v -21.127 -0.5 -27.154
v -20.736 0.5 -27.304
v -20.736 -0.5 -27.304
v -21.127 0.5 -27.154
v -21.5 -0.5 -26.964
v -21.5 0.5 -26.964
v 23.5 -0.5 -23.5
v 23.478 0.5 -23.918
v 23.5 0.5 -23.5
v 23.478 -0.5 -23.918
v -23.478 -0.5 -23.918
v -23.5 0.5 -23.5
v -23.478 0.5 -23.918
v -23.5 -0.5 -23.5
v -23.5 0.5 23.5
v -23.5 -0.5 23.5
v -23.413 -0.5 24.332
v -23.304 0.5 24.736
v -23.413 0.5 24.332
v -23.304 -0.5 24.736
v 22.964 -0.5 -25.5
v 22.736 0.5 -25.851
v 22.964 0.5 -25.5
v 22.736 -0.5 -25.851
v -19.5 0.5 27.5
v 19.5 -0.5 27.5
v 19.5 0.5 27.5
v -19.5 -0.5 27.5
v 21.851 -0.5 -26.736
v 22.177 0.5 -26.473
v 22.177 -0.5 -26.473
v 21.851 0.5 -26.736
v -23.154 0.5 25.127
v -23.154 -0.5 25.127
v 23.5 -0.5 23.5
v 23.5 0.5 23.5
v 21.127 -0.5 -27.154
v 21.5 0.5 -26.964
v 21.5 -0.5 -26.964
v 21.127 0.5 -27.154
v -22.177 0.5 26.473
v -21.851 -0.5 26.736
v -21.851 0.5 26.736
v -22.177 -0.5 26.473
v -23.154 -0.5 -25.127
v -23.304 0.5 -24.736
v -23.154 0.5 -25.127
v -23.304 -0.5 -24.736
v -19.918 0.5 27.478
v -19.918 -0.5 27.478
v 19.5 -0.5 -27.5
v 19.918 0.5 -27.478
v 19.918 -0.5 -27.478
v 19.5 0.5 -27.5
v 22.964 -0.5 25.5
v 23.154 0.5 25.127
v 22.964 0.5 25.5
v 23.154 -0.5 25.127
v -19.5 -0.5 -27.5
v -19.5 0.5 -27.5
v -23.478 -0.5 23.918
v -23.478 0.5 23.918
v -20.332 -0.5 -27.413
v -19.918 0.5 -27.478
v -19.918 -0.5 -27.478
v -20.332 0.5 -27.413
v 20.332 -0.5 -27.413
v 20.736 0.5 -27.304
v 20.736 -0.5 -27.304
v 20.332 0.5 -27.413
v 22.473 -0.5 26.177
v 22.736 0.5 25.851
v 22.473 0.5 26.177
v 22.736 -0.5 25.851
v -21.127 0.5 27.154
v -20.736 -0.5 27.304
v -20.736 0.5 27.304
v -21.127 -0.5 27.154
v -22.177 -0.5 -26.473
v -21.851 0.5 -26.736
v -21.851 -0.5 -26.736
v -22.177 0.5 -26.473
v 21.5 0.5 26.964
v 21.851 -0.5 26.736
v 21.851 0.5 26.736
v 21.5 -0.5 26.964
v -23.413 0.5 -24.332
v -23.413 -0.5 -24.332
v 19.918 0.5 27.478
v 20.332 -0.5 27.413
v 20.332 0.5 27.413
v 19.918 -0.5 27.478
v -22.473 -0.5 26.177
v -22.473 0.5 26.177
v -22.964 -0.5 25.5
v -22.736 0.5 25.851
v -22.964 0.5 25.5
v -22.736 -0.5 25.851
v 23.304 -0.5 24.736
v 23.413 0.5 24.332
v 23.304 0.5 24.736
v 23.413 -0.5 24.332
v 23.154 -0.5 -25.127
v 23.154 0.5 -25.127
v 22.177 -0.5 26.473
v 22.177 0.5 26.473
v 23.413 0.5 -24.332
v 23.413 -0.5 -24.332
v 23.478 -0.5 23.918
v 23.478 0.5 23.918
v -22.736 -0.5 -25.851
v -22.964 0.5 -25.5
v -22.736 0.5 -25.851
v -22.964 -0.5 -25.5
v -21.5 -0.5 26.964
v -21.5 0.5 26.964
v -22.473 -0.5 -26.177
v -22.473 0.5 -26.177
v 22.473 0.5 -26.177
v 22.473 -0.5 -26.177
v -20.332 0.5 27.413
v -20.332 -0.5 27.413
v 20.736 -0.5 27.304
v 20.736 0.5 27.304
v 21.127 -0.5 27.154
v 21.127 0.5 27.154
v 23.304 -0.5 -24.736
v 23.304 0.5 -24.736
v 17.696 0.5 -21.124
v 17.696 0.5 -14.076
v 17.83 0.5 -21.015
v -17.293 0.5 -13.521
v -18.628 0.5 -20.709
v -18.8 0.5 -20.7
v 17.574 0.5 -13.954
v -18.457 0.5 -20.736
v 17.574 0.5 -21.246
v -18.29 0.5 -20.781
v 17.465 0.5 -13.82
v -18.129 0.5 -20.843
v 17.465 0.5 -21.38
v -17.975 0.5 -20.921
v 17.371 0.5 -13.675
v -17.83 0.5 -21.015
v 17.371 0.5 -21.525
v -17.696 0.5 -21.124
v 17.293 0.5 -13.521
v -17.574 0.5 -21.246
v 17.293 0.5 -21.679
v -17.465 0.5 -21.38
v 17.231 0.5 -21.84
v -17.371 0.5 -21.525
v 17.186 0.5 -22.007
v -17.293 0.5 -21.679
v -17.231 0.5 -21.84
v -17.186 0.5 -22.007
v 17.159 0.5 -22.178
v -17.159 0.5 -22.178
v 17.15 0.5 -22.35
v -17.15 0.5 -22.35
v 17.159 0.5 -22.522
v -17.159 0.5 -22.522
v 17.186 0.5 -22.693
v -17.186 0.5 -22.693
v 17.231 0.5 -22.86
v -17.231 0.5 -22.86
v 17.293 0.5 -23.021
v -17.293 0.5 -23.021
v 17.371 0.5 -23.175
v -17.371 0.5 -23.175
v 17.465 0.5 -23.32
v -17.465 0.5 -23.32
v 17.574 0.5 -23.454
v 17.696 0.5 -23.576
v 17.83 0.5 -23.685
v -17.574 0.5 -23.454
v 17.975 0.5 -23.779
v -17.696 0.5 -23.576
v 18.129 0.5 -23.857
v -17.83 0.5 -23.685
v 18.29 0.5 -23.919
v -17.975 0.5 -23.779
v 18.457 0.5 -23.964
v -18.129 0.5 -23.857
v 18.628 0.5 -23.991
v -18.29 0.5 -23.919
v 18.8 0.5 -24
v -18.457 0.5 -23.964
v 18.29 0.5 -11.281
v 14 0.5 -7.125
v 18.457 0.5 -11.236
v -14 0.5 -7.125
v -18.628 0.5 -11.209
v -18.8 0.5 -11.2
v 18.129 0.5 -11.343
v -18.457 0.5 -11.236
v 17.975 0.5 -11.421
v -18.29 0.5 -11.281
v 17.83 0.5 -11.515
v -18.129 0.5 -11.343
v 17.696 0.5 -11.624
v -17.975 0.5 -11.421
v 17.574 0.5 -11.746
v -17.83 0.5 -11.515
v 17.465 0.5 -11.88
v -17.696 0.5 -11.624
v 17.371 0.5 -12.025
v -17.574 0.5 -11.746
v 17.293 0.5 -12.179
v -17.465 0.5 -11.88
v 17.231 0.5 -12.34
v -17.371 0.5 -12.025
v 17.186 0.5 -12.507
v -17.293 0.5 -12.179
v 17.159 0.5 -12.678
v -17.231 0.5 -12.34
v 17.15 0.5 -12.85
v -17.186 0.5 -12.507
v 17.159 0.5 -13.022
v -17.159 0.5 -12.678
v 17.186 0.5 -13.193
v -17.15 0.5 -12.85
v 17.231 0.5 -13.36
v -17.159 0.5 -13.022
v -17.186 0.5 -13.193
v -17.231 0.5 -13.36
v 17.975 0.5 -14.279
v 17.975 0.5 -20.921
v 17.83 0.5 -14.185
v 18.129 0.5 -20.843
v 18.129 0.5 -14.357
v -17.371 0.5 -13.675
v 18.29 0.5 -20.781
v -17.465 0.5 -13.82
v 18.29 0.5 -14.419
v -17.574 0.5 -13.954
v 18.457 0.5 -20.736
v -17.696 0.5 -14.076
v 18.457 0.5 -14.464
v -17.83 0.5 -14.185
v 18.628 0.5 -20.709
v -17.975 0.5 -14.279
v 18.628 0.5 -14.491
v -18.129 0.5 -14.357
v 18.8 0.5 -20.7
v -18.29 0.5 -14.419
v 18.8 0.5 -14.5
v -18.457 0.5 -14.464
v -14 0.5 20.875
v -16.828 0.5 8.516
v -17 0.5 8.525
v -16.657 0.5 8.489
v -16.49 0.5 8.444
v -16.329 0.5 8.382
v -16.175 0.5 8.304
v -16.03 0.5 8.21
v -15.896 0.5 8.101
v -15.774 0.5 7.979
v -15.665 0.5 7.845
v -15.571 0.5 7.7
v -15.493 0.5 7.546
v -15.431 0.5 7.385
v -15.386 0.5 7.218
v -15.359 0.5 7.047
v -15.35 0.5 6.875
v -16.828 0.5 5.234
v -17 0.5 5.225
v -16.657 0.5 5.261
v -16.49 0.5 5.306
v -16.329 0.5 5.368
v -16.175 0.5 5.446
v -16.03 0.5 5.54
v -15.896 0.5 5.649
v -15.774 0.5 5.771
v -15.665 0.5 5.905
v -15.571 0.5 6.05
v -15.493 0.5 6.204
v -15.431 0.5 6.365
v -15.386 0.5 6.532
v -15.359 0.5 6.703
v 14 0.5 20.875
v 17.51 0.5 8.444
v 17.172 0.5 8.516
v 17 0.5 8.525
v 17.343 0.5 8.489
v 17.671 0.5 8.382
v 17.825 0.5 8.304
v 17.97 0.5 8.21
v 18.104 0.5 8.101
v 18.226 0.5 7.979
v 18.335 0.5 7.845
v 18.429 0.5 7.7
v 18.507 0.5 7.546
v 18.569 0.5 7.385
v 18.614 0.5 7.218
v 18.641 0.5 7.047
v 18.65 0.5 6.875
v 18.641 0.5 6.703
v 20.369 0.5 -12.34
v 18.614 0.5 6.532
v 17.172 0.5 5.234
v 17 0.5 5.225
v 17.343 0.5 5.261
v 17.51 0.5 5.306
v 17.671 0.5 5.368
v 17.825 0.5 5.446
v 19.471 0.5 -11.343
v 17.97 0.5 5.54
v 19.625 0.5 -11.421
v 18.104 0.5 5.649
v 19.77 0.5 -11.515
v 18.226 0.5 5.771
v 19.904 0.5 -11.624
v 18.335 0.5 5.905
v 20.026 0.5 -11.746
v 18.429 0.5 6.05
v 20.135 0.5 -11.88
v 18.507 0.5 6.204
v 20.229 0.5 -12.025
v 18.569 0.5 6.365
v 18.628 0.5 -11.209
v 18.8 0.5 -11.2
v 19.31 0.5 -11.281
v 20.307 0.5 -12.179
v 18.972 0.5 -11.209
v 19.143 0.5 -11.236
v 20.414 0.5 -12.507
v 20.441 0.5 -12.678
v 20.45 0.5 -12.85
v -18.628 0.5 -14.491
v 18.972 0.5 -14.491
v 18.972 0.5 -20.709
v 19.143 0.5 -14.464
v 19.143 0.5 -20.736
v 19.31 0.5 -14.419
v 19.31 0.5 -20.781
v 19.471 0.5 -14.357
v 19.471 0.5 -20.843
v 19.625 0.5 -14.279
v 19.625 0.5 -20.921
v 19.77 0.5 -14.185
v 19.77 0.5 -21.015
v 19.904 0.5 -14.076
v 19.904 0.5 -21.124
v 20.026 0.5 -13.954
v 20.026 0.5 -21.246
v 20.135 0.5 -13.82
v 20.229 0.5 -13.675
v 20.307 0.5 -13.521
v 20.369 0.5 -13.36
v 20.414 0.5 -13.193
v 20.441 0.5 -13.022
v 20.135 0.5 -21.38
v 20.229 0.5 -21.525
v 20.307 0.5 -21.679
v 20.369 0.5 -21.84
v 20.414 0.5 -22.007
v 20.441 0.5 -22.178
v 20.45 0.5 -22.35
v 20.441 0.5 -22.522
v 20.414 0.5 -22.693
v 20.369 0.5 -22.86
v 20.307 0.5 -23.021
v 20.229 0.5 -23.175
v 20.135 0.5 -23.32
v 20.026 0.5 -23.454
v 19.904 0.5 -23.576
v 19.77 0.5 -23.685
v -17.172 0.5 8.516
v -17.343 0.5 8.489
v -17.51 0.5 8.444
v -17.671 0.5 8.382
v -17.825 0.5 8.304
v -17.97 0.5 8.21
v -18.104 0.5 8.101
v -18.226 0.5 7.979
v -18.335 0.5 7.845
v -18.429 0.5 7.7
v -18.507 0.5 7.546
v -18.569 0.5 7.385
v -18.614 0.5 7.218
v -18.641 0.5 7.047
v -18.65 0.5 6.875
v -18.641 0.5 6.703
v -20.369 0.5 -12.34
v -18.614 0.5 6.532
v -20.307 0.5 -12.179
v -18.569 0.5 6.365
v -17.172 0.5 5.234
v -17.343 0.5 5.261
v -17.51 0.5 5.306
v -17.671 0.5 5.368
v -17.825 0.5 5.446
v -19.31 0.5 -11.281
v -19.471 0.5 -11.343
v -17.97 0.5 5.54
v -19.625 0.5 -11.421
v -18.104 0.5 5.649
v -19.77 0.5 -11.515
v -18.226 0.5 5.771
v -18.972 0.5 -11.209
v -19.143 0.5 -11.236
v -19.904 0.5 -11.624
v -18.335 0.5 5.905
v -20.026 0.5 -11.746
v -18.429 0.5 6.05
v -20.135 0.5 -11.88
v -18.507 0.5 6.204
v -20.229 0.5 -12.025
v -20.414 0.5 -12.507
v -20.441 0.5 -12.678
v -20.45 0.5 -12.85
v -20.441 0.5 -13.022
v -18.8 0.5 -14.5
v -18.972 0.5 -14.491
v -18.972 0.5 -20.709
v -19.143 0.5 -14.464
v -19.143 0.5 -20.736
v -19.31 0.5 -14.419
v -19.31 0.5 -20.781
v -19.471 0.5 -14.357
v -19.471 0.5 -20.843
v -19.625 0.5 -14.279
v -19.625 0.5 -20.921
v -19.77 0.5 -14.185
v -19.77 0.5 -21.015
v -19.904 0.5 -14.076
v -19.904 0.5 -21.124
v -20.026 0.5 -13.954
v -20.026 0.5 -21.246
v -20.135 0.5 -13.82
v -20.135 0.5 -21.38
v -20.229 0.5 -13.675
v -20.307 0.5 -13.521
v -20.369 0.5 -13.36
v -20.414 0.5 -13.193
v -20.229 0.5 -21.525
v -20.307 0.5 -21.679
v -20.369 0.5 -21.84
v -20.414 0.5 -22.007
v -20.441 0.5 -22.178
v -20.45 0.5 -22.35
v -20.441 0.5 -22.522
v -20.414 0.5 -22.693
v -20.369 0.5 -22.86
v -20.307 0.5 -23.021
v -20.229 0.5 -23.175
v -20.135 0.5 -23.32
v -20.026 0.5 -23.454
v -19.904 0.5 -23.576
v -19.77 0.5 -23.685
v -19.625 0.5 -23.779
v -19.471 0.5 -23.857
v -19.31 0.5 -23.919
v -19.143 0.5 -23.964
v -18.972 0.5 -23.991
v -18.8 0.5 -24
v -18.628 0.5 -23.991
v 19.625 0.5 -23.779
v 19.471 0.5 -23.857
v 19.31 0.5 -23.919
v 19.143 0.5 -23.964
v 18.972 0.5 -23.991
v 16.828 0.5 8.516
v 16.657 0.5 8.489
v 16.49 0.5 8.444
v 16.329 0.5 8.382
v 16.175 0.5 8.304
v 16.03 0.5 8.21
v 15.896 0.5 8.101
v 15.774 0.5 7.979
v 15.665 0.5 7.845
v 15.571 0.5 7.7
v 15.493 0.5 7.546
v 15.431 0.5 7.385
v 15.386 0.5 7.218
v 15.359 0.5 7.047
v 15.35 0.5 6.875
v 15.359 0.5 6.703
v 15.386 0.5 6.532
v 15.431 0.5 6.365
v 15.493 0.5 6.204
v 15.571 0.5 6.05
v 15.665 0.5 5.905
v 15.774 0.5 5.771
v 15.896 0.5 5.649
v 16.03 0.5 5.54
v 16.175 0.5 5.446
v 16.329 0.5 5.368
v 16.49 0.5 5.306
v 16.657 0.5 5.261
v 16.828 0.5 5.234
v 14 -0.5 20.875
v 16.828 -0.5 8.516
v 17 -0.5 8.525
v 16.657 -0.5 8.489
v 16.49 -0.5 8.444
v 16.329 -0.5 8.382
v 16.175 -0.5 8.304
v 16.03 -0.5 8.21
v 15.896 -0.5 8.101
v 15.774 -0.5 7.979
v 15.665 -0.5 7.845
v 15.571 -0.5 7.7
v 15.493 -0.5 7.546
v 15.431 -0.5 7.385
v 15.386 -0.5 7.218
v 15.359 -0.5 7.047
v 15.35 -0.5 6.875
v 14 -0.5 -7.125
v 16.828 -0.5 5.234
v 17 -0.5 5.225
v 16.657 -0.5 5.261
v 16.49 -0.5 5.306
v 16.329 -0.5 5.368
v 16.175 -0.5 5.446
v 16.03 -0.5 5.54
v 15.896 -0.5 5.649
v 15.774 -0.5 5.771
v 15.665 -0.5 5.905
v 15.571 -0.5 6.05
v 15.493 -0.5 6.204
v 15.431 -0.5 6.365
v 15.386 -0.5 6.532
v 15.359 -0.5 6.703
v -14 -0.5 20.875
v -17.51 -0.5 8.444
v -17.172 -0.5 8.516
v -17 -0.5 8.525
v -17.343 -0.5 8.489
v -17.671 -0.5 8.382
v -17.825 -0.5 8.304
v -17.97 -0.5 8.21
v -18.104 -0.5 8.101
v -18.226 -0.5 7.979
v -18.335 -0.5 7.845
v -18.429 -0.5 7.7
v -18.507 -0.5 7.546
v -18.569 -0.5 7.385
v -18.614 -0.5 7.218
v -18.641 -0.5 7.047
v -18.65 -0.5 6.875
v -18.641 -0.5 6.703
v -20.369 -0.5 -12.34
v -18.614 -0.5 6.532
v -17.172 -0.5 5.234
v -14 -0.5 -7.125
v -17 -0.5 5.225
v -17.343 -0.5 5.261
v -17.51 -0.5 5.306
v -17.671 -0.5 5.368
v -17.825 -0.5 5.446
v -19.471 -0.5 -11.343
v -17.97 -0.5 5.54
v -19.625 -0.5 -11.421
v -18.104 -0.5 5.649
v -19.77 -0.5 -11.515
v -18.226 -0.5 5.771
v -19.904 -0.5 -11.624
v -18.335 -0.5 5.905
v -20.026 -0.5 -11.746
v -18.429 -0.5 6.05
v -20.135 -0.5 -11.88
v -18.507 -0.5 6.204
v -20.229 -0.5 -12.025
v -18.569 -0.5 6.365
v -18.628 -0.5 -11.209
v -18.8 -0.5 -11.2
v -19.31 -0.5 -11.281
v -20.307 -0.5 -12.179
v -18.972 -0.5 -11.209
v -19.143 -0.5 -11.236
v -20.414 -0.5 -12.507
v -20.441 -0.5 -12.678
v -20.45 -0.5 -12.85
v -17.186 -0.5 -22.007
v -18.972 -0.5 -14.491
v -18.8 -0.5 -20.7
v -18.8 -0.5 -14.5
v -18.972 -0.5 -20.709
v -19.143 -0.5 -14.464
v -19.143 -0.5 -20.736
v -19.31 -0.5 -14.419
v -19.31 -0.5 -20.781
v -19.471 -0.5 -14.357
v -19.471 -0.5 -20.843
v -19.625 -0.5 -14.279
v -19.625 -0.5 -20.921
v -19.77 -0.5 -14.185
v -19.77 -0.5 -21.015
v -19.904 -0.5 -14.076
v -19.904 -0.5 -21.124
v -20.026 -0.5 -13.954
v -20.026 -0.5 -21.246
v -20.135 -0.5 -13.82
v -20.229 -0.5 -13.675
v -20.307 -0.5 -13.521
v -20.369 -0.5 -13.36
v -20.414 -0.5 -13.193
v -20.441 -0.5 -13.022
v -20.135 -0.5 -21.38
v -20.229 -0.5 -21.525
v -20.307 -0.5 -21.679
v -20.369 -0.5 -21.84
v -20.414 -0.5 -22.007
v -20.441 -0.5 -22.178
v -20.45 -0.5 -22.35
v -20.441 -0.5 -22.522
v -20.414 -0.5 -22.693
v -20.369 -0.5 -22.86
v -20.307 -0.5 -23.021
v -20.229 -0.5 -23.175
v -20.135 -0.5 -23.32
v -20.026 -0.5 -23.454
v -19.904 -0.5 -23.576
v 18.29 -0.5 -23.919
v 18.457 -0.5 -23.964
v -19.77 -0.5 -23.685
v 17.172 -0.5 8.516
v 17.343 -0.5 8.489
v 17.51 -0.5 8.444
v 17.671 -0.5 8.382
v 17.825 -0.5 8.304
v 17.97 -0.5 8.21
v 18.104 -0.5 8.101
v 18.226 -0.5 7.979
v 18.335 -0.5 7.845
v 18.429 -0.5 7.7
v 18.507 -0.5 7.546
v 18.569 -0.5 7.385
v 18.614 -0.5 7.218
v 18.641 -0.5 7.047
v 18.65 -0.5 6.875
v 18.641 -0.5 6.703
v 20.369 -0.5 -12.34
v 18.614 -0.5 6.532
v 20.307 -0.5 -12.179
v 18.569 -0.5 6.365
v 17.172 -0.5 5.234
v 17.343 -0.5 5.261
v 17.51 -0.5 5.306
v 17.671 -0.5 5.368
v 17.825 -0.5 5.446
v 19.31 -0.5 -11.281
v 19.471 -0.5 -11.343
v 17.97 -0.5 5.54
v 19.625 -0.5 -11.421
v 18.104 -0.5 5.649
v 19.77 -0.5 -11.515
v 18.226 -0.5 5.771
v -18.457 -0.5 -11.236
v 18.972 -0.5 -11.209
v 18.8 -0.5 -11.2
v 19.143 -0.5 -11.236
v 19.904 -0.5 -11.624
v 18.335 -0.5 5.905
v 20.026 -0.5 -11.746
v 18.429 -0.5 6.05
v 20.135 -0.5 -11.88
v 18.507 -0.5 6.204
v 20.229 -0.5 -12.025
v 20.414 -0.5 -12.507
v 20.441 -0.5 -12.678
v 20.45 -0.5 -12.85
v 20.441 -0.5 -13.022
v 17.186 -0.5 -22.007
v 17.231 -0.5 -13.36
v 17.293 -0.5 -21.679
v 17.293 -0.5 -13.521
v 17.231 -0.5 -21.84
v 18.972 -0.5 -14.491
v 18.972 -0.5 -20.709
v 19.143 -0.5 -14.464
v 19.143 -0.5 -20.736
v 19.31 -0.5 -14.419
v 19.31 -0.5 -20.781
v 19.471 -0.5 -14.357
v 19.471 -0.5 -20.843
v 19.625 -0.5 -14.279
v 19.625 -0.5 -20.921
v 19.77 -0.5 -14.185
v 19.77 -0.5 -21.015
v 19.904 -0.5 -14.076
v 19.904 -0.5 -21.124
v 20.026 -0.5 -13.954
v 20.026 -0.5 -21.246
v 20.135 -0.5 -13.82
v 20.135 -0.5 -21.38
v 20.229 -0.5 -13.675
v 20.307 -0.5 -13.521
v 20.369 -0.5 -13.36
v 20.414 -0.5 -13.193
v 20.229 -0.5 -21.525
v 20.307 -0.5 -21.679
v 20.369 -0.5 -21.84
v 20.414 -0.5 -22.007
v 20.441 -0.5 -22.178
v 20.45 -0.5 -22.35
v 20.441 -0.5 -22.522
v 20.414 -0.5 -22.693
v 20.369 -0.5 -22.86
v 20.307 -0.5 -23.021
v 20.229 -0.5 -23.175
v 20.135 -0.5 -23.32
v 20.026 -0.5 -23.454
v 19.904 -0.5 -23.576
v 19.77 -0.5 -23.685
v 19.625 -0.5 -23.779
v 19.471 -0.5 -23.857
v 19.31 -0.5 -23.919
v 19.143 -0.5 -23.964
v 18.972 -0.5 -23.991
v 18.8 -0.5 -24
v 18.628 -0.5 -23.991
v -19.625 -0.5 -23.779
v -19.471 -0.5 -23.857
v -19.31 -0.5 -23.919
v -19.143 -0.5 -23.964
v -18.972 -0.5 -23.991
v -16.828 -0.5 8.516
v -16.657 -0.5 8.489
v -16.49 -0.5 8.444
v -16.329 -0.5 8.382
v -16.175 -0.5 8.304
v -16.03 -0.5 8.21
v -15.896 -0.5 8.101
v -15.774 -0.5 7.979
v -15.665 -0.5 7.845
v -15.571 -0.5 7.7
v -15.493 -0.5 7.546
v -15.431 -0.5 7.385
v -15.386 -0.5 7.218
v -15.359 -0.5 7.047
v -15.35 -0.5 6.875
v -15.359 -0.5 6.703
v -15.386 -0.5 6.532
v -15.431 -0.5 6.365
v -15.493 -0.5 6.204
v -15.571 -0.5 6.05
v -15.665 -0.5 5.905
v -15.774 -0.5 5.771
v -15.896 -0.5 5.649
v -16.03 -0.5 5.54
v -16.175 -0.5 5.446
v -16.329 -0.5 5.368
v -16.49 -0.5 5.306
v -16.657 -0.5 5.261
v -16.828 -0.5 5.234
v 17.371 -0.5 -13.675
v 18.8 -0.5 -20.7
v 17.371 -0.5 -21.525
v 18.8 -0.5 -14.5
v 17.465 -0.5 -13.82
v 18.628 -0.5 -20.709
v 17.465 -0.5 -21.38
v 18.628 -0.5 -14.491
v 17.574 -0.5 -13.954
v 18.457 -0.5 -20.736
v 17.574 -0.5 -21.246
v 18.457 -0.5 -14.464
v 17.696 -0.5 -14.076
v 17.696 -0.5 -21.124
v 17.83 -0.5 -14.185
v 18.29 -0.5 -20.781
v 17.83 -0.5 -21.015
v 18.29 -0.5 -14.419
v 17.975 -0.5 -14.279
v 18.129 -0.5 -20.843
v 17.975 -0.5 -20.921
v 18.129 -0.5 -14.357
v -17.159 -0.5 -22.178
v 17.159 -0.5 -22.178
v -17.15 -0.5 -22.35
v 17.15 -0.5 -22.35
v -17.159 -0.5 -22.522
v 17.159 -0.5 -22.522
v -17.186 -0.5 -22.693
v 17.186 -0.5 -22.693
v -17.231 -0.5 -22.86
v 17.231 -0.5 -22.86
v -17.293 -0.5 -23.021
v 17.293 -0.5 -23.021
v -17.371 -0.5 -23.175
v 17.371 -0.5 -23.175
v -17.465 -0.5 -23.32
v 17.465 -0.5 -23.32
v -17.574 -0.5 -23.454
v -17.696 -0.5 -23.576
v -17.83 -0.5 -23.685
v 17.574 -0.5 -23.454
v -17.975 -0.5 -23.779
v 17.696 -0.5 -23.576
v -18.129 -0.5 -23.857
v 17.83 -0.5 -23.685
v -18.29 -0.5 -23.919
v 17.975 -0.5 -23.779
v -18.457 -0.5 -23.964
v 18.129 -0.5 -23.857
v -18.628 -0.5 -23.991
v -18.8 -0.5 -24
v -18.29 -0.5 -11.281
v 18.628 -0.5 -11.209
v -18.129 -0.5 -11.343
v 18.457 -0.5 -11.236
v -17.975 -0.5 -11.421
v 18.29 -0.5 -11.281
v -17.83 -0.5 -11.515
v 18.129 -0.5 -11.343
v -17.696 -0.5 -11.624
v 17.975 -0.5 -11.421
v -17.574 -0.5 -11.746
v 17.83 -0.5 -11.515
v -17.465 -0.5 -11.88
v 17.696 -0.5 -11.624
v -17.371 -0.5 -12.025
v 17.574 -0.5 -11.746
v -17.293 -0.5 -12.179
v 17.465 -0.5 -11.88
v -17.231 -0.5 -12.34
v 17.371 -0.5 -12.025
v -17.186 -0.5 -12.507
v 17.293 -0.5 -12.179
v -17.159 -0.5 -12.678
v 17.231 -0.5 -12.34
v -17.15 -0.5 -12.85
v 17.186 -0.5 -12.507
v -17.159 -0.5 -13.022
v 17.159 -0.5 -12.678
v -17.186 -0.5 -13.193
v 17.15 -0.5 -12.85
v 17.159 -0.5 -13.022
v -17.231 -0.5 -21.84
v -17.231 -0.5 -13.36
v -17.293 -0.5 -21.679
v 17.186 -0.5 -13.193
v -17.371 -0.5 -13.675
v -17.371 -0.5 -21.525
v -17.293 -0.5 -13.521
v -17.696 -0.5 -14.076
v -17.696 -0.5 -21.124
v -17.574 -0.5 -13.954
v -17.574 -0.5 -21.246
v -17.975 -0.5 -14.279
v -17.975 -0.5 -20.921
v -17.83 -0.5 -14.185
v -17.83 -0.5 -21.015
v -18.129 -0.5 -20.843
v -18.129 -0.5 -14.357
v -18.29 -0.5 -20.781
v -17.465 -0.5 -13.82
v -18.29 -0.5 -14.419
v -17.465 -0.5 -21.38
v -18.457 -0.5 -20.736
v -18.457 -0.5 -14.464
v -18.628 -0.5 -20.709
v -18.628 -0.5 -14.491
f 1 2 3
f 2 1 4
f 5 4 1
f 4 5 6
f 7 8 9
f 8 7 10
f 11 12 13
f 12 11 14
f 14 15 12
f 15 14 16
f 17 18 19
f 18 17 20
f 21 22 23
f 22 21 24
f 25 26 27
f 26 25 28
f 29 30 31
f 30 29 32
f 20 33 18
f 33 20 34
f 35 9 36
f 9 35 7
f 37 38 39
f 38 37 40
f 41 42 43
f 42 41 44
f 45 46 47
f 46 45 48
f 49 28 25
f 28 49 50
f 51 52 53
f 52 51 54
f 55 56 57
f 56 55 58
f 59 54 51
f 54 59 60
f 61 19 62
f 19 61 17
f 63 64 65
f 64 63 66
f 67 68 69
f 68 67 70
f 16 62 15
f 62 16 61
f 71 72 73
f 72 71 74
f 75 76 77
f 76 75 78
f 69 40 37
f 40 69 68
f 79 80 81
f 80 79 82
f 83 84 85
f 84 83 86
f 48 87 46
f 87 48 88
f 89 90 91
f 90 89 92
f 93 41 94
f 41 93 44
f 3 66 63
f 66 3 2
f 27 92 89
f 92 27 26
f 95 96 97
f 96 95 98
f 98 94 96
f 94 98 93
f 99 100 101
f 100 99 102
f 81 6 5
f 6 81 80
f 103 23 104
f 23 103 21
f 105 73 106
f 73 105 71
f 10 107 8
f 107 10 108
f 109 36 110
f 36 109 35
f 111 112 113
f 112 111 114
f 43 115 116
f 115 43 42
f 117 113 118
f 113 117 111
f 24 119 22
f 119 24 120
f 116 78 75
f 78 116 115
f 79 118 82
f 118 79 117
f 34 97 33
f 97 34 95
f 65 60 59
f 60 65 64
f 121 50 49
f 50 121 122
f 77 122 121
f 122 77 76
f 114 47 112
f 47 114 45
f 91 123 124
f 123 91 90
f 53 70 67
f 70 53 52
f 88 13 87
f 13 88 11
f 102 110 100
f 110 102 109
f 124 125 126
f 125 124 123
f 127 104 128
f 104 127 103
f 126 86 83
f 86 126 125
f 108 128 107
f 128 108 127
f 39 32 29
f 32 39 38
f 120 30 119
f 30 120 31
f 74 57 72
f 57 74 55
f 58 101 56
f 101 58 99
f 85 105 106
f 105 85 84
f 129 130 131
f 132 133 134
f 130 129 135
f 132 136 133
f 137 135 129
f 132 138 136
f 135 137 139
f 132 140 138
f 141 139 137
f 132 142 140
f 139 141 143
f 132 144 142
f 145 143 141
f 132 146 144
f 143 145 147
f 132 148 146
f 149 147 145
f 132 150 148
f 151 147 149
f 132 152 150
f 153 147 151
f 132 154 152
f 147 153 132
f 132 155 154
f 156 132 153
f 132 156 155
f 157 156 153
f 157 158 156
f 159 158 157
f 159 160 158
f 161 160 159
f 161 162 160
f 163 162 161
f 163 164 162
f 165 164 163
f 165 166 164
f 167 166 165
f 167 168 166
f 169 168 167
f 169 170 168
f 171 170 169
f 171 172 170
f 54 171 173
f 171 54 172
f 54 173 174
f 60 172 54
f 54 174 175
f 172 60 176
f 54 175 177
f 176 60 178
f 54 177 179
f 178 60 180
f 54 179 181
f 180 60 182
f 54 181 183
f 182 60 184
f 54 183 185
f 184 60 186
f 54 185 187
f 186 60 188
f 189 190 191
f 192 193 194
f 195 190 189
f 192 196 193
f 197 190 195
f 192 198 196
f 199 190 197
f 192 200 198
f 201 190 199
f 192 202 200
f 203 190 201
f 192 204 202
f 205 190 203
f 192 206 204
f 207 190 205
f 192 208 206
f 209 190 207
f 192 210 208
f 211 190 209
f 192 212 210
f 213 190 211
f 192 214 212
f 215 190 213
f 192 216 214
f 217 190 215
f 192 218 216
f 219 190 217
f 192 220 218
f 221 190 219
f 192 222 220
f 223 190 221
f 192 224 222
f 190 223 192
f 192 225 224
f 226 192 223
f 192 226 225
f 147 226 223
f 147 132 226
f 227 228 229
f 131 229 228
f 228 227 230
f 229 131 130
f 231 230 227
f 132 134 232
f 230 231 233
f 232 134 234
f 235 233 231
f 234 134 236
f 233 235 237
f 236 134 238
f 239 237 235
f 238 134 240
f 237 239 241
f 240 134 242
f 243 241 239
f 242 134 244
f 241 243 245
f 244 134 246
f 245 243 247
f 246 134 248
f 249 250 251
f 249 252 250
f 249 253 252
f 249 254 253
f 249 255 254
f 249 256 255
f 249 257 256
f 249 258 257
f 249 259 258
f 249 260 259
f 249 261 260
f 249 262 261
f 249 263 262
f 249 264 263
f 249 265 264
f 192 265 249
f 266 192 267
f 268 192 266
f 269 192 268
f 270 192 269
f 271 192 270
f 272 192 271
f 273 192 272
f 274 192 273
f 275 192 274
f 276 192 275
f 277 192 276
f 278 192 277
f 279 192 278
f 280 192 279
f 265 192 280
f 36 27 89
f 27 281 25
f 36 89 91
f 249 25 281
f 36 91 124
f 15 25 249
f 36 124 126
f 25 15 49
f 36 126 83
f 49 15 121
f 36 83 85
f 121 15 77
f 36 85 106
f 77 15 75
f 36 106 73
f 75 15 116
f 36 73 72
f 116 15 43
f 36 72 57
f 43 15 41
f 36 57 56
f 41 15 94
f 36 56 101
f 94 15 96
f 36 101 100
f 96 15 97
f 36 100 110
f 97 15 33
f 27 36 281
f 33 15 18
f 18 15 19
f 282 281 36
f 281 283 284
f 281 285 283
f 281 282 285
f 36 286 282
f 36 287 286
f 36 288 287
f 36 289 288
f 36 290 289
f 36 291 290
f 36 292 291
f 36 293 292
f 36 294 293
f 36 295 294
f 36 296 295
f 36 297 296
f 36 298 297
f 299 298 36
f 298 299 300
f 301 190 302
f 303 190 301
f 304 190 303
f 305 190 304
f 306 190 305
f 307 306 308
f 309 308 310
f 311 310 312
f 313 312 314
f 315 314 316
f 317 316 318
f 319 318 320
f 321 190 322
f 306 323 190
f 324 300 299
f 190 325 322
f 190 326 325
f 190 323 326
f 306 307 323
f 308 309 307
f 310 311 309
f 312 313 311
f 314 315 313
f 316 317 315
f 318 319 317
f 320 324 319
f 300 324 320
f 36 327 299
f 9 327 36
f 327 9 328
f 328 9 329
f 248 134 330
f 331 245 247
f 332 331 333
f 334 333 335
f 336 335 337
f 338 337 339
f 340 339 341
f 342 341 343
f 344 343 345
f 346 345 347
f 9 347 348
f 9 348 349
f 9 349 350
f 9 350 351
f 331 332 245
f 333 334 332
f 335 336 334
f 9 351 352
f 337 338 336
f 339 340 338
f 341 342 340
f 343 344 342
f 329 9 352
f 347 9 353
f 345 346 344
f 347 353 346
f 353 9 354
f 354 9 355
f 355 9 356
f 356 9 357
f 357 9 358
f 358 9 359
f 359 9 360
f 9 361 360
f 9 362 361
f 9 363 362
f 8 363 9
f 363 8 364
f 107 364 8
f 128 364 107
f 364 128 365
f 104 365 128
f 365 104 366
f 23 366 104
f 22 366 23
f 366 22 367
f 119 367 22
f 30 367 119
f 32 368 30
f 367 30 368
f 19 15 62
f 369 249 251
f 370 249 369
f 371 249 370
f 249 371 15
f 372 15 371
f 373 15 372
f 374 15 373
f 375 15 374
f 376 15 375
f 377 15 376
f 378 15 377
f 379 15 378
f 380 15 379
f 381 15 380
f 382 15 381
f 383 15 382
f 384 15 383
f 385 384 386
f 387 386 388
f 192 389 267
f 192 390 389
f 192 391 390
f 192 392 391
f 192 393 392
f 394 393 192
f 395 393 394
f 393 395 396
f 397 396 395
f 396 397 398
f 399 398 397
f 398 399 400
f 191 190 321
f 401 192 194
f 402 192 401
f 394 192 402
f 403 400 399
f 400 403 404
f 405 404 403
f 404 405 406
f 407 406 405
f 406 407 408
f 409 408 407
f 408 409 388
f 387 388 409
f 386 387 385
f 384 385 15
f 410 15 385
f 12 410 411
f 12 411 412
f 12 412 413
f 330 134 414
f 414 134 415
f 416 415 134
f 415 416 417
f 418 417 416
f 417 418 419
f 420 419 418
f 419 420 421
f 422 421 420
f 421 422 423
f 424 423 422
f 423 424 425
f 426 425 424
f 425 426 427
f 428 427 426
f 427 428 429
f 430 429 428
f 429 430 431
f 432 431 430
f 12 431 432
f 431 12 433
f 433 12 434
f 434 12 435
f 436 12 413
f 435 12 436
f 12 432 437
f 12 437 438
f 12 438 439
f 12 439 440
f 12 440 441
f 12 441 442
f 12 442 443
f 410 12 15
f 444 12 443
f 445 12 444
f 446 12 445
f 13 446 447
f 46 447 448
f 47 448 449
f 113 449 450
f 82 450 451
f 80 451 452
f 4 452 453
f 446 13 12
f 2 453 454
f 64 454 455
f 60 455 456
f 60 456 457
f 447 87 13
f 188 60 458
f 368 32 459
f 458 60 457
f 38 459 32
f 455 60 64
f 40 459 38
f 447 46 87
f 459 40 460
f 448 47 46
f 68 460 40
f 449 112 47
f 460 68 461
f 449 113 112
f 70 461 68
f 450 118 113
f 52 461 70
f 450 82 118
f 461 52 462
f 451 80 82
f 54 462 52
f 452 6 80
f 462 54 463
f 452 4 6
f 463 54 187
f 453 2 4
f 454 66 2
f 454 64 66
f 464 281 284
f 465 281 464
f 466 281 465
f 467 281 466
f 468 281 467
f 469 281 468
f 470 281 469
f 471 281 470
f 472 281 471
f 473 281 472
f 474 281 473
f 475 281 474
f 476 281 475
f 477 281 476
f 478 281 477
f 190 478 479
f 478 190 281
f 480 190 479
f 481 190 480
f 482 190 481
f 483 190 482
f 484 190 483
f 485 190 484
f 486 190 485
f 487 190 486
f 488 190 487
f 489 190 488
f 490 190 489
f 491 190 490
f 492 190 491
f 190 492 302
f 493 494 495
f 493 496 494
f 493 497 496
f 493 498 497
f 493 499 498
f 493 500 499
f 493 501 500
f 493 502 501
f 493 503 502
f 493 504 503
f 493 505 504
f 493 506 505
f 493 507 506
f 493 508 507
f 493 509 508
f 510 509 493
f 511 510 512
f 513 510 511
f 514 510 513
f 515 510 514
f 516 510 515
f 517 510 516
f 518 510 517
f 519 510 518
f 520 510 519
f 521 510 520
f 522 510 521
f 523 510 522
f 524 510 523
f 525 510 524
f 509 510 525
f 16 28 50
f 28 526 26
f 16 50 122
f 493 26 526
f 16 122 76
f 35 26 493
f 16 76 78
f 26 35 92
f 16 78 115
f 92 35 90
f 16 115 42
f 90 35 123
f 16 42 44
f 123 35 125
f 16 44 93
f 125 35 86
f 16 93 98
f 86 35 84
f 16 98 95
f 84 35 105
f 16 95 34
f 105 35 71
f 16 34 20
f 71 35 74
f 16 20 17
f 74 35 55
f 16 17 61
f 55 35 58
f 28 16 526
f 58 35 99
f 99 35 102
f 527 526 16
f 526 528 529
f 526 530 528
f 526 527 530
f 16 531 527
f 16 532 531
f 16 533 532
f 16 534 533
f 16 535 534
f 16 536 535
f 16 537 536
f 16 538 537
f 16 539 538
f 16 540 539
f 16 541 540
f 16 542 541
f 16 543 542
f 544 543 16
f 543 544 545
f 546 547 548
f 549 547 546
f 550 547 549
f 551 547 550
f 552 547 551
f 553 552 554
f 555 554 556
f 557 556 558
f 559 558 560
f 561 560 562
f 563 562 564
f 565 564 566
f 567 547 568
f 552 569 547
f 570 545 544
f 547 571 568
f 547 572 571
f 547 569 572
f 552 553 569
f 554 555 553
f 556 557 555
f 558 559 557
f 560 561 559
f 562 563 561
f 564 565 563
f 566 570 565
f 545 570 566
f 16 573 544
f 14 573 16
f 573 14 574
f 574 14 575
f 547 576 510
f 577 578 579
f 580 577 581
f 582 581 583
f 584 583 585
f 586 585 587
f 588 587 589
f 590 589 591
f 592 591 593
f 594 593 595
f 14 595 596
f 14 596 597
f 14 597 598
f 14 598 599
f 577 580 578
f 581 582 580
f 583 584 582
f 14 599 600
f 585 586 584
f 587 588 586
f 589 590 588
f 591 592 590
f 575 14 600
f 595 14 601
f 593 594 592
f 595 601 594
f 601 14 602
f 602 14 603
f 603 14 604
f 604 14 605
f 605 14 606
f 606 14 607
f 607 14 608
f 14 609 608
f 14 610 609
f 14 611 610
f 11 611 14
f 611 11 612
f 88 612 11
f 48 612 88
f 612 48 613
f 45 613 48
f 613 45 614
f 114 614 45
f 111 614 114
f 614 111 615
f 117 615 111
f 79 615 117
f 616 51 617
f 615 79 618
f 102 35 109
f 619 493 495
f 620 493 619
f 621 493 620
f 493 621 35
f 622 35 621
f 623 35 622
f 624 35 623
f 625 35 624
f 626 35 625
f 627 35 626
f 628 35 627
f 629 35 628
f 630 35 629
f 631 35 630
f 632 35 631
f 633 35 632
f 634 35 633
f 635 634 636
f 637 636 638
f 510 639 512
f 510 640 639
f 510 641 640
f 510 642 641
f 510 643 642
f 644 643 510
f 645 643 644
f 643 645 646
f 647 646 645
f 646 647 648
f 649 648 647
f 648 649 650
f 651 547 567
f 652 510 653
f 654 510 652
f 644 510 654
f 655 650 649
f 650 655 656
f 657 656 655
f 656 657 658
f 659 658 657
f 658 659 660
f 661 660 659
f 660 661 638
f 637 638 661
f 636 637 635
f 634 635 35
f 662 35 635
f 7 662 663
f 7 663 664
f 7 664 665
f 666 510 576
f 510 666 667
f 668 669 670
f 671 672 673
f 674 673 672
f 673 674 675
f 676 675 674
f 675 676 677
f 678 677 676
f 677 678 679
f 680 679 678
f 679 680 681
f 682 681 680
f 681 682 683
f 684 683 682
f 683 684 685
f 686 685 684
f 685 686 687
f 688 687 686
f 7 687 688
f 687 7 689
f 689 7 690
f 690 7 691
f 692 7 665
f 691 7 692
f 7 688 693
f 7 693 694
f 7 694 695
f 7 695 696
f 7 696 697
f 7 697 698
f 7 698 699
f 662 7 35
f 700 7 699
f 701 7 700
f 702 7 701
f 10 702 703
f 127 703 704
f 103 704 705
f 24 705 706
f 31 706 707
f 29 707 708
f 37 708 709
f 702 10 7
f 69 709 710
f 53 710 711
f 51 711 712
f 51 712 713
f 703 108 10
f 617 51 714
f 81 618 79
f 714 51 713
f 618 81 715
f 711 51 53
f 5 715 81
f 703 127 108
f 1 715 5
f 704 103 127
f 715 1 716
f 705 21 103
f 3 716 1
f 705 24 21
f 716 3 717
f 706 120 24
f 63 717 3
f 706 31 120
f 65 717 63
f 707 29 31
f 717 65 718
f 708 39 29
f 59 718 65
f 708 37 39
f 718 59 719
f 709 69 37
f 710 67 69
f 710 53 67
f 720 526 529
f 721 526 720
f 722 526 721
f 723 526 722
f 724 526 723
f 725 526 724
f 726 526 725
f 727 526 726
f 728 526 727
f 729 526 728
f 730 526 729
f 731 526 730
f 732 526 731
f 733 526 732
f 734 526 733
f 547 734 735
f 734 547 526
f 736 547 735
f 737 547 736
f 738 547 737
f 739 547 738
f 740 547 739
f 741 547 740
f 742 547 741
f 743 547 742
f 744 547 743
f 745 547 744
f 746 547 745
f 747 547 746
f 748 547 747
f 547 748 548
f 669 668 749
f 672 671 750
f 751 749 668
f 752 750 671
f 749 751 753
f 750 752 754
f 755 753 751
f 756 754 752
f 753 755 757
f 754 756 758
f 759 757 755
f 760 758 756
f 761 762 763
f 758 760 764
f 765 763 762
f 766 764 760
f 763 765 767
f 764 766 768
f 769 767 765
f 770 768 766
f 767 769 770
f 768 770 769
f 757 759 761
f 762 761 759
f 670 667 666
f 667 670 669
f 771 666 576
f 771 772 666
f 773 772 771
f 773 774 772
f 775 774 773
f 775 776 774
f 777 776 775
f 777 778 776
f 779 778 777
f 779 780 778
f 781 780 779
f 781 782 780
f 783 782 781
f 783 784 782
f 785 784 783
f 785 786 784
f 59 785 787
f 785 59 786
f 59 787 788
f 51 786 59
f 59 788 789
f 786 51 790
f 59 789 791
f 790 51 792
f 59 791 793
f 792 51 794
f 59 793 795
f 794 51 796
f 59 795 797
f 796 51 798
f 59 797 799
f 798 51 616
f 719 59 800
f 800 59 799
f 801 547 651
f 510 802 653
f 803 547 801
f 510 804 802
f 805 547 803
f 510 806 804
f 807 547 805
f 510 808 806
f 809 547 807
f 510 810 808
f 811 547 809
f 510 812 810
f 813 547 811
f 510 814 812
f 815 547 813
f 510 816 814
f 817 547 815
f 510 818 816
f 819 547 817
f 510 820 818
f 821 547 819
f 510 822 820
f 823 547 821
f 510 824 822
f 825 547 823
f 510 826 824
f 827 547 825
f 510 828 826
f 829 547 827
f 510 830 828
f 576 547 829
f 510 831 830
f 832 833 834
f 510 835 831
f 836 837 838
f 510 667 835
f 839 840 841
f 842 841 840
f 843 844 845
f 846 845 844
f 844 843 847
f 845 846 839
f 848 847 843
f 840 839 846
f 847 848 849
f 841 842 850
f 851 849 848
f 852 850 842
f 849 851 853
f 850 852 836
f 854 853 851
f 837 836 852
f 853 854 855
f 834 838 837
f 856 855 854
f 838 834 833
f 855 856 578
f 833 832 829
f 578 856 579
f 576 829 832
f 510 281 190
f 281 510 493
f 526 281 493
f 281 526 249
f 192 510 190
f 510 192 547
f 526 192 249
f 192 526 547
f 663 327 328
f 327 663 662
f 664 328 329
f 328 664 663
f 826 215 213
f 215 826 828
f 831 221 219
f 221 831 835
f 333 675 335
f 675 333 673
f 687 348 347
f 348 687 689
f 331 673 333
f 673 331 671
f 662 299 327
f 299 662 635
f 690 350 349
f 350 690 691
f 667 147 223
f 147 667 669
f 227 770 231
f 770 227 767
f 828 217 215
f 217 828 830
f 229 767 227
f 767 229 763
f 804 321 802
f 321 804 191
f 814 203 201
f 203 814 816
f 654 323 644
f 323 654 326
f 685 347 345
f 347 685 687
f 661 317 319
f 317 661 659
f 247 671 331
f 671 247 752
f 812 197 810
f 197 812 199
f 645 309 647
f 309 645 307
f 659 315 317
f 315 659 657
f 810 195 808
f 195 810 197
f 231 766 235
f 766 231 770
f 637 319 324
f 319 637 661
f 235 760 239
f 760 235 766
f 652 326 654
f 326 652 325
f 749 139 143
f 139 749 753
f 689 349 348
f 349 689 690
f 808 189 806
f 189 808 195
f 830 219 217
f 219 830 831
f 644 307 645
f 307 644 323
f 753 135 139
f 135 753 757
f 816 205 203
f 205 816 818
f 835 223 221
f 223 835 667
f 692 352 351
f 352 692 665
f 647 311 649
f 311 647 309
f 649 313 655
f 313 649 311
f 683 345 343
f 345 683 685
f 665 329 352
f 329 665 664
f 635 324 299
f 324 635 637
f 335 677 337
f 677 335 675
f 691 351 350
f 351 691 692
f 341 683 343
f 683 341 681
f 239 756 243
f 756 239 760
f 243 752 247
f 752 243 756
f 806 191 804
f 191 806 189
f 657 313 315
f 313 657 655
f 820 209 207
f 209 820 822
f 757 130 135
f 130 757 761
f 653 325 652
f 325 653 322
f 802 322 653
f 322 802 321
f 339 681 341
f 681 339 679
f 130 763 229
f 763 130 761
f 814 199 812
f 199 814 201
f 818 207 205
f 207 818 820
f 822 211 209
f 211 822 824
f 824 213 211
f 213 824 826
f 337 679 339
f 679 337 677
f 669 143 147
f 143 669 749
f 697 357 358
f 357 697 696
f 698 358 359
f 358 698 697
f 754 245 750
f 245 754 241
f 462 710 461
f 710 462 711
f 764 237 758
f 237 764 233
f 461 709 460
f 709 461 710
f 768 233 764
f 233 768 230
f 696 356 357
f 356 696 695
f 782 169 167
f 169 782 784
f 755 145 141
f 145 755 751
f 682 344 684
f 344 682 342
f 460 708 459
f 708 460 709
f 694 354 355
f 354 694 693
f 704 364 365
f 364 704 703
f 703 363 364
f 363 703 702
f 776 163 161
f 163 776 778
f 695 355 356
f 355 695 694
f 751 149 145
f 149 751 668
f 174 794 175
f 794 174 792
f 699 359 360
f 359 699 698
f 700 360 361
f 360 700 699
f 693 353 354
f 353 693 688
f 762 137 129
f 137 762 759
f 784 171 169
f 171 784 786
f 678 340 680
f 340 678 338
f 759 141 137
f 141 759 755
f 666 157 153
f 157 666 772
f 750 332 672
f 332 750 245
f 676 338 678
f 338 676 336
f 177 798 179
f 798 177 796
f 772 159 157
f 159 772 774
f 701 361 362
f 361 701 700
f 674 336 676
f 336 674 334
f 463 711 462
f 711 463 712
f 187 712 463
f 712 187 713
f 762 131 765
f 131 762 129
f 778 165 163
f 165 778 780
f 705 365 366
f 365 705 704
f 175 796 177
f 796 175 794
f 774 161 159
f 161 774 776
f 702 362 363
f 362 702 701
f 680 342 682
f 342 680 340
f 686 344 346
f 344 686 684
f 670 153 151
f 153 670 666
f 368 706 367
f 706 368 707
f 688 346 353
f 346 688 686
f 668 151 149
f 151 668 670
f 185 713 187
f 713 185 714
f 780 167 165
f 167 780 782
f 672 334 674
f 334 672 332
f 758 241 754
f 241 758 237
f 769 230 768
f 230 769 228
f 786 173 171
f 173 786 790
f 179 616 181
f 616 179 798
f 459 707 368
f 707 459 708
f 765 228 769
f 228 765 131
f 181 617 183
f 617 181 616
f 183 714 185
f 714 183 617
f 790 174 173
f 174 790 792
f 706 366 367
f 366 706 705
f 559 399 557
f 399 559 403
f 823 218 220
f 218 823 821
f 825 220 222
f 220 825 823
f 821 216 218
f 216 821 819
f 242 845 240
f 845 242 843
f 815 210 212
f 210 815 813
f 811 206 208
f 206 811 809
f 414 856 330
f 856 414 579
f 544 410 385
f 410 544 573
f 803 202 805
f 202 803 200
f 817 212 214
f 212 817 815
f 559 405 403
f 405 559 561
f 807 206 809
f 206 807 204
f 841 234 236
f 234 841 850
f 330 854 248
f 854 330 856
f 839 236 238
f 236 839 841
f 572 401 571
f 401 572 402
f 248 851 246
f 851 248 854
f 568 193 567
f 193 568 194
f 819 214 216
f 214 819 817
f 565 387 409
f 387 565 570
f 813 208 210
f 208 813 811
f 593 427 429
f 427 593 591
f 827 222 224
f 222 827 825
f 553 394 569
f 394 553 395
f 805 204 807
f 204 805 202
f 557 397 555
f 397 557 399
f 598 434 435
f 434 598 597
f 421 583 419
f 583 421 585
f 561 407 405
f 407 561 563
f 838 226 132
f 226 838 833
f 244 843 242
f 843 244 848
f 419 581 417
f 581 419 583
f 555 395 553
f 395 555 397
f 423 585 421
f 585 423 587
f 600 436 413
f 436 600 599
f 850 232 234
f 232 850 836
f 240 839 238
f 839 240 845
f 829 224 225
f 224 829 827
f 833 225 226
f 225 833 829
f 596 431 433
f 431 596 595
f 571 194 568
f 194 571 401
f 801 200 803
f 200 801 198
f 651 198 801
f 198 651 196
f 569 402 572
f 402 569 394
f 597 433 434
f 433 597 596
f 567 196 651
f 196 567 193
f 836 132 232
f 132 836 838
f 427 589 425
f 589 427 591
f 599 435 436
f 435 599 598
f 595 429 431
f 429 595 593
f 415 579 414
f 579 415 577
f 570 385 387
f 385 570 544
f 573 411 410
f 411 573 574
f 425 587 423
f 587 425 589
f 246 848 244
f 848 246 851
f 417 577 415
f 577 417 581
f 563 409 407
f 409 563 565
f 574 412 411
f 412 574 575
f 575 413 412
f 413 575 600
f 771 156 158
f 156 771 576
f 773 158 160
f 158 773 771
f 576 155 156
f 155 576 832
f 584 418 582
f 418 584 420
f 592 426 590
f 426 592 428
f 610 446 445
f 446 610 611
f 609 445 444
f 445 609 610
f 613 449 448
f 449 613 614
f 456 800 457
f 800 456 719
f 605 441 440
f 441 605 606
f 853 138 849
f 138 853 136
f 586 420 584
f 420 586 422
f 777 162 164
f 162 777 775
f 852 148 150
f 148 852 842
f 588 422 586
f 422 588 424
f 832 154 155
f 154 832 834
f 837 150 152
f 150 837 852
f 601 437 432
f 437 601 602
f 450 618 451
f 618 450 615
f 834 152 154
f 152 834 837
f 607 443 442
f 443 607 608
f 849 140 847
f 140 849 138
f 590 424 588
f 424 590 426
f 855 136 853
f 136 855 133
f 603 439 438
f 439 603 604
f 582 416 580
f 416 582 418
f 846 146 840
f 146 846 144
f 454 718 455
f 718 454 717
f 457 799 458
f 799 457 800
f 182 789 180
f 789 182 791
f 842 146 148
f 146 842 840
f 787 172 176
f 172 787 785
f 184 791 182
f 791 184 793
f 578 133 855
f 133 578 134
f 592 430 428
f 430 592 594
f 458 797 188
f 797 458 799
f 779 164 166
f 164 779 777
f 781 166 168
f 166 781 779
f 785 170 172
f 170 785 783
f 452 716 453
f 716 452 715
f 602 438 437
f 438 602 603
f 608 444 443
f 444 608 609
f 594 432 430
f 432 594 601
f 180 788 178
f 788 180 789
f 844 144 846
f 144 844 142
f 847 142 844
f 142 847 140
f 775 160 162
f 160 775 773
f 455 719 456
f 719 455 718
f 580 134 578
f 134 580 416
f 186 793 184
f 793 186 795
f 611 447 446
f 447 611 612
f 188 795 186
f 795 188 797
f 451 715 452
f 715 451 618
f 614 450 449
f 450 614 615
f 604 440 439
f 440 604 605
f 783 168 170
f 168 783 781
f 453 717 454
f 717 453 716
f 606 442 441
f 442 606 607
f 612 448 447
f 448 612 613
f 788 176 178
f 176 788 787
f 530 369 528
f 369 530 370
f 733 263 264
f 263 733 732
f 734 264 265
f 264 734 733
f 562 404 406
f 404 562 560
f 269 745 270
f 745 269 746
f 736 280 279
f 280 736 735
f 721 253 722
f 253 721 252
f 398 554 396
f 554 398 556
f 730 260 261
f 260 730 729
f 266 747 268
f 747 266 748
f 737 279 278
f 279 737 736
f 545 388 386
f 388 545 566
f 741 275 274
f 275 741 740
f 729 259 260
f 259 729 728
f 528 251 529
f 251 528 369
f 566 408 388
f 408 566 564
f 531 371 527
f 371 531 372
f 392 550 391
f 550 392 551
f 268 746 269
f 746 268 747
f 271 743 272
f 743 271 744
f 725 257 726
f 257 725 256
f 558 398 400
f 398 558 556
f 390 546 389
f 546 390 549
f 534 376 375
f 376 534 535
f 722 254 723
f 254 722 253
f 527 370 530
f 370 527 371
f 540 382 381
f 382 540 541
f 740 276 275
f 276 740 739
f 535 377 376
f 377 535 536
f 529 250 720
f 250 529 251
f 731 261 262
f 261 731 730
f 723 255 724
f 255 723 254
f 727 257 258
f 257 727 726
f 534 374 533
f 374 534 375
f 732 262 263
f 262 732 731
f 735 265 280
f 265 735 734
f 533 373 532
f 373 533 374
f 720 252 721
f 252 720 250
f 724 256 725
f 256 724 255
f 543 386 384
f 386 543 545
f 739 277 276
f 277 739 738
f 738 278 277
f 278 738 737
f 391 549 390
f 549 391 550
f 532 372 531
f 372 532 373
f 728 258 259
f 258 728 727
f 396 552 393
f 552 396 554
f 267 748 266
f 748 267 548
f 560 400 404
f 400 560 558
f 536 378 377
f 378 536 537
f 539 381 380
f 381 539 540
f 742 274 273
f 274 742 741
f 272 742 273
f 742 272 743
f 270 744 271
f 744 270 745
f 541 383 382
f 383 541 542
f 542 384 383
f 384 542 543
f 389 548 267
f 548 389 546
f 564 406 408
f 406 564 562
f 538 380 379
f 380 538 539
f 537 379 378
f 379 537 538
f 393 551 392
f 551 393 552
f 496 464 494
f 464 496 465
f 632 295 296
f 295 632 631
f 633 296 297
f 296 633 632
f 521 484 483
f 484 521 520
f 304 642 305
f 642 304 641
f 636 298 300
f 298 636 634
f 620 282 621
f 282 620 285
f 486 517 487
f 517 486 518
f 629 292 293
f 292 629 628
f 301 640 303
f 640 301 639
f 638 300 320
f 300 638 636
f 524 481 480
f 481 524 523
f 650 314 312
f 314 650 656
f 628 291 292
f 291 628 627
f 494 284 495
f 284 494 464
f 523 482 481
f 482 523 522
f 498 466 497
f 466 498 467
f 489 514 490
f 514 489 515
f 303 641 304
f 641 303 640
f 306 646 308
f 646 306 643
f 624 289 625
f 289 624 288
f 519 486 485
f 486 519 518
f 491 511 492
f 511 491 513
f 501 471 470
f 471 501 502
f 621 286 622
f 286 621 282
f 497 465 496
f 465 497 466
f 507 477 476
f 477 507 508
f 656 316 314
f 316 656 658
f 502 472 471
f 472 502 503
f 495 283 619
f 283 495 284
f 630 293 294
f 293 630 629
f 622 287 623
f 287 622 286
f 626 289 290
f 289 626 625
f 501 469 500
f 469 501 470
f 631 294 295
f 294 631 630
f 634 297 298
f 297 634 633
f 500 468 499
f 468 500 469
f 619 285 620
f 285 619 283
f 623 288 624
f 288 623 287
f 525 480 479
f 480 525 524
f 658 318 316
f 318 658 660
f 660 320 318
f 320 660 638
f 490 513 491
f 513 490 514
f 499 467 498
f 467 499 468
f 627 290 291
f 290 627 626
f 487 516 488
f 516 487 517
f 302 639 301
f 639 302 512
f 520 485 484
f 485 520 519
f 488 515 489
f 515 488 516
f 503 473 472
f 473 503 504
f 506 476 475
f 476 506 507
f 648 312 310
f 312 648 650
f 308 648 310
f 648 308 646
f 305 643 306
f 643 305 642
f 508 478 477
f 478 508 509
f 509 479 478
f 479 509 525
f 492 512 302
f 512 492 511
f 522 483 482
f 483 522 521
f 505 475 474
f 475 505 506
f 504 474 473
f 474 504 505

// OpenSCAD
$fn = 60;

mount_width = 47;
mount_height = 55;

hole_size = 28;
//thickness = 5;
thickness = 1;

mount_hole_radius = 3.3/2;
mount_hole_vertical_separation = 9.5;

square_hole_z_offset = mount_height/8;

module hole() {
    rotate([90, 0, 0]) cylinder(h = thickness+1, r = mount_hole_radius, center = true);
}
    

module camera_holes() {
    offset = hole_size/2+3.0;
    offsets = [[-offset, 0], [offset, 0]];
    
    for(o = offsets) {
        echo(o);
        
        translate([o[0], 0, square_hole_z_offset+o[1]]) {
            hole();
        }
    }
}

module flat_rounded_cube(size, rounding_radius) {
    width = size[0];
    height = size[1];
    echo(width, height);
    x_offset = width/2 - rounding_radius;
    z_offset = height/2 - rounding_radius;
    
    hull() {
        for(x = [x_offset, -x_offset]) {
            for(z = [z_offset, -z_offset]) {
                translate([x, 0, z]) {
                    rotate([90, 0, 0]) {
                        cylinder(h = thickness, r = rounding_radius, center = true);
                    }
                }
            }
        }
    }
}

module mount_square() {
    flat_rounded_cube([mount_width, mount_height, thickness], 4);
}

module holy_mount_square() {
    difference() {
        mount_square();
        translate([0, 0, square_hole_z_offset]) {
            cube([hole_size, thickness + 1, hole_size], center = true);
        }
    }
}

module mount_hole_array() {
    x_offset = mount_width * 0.8 / 2;
    z_offset = mount_hole_vertical_separation/2;
    
    for(x = [x_offset, -x_offset]) {
        for(z = [z_offset, -z_offset]) {
            translate([x, 0, z]) hole();
        }
    }
}

module complete_mount() {
    difference() {
        holy_mount_square();
        union() {
            translate([0, 0, -mount_height*0.32]) mount_hole_array();
            camera_holes();
        }
    }
}

complete_mount();
